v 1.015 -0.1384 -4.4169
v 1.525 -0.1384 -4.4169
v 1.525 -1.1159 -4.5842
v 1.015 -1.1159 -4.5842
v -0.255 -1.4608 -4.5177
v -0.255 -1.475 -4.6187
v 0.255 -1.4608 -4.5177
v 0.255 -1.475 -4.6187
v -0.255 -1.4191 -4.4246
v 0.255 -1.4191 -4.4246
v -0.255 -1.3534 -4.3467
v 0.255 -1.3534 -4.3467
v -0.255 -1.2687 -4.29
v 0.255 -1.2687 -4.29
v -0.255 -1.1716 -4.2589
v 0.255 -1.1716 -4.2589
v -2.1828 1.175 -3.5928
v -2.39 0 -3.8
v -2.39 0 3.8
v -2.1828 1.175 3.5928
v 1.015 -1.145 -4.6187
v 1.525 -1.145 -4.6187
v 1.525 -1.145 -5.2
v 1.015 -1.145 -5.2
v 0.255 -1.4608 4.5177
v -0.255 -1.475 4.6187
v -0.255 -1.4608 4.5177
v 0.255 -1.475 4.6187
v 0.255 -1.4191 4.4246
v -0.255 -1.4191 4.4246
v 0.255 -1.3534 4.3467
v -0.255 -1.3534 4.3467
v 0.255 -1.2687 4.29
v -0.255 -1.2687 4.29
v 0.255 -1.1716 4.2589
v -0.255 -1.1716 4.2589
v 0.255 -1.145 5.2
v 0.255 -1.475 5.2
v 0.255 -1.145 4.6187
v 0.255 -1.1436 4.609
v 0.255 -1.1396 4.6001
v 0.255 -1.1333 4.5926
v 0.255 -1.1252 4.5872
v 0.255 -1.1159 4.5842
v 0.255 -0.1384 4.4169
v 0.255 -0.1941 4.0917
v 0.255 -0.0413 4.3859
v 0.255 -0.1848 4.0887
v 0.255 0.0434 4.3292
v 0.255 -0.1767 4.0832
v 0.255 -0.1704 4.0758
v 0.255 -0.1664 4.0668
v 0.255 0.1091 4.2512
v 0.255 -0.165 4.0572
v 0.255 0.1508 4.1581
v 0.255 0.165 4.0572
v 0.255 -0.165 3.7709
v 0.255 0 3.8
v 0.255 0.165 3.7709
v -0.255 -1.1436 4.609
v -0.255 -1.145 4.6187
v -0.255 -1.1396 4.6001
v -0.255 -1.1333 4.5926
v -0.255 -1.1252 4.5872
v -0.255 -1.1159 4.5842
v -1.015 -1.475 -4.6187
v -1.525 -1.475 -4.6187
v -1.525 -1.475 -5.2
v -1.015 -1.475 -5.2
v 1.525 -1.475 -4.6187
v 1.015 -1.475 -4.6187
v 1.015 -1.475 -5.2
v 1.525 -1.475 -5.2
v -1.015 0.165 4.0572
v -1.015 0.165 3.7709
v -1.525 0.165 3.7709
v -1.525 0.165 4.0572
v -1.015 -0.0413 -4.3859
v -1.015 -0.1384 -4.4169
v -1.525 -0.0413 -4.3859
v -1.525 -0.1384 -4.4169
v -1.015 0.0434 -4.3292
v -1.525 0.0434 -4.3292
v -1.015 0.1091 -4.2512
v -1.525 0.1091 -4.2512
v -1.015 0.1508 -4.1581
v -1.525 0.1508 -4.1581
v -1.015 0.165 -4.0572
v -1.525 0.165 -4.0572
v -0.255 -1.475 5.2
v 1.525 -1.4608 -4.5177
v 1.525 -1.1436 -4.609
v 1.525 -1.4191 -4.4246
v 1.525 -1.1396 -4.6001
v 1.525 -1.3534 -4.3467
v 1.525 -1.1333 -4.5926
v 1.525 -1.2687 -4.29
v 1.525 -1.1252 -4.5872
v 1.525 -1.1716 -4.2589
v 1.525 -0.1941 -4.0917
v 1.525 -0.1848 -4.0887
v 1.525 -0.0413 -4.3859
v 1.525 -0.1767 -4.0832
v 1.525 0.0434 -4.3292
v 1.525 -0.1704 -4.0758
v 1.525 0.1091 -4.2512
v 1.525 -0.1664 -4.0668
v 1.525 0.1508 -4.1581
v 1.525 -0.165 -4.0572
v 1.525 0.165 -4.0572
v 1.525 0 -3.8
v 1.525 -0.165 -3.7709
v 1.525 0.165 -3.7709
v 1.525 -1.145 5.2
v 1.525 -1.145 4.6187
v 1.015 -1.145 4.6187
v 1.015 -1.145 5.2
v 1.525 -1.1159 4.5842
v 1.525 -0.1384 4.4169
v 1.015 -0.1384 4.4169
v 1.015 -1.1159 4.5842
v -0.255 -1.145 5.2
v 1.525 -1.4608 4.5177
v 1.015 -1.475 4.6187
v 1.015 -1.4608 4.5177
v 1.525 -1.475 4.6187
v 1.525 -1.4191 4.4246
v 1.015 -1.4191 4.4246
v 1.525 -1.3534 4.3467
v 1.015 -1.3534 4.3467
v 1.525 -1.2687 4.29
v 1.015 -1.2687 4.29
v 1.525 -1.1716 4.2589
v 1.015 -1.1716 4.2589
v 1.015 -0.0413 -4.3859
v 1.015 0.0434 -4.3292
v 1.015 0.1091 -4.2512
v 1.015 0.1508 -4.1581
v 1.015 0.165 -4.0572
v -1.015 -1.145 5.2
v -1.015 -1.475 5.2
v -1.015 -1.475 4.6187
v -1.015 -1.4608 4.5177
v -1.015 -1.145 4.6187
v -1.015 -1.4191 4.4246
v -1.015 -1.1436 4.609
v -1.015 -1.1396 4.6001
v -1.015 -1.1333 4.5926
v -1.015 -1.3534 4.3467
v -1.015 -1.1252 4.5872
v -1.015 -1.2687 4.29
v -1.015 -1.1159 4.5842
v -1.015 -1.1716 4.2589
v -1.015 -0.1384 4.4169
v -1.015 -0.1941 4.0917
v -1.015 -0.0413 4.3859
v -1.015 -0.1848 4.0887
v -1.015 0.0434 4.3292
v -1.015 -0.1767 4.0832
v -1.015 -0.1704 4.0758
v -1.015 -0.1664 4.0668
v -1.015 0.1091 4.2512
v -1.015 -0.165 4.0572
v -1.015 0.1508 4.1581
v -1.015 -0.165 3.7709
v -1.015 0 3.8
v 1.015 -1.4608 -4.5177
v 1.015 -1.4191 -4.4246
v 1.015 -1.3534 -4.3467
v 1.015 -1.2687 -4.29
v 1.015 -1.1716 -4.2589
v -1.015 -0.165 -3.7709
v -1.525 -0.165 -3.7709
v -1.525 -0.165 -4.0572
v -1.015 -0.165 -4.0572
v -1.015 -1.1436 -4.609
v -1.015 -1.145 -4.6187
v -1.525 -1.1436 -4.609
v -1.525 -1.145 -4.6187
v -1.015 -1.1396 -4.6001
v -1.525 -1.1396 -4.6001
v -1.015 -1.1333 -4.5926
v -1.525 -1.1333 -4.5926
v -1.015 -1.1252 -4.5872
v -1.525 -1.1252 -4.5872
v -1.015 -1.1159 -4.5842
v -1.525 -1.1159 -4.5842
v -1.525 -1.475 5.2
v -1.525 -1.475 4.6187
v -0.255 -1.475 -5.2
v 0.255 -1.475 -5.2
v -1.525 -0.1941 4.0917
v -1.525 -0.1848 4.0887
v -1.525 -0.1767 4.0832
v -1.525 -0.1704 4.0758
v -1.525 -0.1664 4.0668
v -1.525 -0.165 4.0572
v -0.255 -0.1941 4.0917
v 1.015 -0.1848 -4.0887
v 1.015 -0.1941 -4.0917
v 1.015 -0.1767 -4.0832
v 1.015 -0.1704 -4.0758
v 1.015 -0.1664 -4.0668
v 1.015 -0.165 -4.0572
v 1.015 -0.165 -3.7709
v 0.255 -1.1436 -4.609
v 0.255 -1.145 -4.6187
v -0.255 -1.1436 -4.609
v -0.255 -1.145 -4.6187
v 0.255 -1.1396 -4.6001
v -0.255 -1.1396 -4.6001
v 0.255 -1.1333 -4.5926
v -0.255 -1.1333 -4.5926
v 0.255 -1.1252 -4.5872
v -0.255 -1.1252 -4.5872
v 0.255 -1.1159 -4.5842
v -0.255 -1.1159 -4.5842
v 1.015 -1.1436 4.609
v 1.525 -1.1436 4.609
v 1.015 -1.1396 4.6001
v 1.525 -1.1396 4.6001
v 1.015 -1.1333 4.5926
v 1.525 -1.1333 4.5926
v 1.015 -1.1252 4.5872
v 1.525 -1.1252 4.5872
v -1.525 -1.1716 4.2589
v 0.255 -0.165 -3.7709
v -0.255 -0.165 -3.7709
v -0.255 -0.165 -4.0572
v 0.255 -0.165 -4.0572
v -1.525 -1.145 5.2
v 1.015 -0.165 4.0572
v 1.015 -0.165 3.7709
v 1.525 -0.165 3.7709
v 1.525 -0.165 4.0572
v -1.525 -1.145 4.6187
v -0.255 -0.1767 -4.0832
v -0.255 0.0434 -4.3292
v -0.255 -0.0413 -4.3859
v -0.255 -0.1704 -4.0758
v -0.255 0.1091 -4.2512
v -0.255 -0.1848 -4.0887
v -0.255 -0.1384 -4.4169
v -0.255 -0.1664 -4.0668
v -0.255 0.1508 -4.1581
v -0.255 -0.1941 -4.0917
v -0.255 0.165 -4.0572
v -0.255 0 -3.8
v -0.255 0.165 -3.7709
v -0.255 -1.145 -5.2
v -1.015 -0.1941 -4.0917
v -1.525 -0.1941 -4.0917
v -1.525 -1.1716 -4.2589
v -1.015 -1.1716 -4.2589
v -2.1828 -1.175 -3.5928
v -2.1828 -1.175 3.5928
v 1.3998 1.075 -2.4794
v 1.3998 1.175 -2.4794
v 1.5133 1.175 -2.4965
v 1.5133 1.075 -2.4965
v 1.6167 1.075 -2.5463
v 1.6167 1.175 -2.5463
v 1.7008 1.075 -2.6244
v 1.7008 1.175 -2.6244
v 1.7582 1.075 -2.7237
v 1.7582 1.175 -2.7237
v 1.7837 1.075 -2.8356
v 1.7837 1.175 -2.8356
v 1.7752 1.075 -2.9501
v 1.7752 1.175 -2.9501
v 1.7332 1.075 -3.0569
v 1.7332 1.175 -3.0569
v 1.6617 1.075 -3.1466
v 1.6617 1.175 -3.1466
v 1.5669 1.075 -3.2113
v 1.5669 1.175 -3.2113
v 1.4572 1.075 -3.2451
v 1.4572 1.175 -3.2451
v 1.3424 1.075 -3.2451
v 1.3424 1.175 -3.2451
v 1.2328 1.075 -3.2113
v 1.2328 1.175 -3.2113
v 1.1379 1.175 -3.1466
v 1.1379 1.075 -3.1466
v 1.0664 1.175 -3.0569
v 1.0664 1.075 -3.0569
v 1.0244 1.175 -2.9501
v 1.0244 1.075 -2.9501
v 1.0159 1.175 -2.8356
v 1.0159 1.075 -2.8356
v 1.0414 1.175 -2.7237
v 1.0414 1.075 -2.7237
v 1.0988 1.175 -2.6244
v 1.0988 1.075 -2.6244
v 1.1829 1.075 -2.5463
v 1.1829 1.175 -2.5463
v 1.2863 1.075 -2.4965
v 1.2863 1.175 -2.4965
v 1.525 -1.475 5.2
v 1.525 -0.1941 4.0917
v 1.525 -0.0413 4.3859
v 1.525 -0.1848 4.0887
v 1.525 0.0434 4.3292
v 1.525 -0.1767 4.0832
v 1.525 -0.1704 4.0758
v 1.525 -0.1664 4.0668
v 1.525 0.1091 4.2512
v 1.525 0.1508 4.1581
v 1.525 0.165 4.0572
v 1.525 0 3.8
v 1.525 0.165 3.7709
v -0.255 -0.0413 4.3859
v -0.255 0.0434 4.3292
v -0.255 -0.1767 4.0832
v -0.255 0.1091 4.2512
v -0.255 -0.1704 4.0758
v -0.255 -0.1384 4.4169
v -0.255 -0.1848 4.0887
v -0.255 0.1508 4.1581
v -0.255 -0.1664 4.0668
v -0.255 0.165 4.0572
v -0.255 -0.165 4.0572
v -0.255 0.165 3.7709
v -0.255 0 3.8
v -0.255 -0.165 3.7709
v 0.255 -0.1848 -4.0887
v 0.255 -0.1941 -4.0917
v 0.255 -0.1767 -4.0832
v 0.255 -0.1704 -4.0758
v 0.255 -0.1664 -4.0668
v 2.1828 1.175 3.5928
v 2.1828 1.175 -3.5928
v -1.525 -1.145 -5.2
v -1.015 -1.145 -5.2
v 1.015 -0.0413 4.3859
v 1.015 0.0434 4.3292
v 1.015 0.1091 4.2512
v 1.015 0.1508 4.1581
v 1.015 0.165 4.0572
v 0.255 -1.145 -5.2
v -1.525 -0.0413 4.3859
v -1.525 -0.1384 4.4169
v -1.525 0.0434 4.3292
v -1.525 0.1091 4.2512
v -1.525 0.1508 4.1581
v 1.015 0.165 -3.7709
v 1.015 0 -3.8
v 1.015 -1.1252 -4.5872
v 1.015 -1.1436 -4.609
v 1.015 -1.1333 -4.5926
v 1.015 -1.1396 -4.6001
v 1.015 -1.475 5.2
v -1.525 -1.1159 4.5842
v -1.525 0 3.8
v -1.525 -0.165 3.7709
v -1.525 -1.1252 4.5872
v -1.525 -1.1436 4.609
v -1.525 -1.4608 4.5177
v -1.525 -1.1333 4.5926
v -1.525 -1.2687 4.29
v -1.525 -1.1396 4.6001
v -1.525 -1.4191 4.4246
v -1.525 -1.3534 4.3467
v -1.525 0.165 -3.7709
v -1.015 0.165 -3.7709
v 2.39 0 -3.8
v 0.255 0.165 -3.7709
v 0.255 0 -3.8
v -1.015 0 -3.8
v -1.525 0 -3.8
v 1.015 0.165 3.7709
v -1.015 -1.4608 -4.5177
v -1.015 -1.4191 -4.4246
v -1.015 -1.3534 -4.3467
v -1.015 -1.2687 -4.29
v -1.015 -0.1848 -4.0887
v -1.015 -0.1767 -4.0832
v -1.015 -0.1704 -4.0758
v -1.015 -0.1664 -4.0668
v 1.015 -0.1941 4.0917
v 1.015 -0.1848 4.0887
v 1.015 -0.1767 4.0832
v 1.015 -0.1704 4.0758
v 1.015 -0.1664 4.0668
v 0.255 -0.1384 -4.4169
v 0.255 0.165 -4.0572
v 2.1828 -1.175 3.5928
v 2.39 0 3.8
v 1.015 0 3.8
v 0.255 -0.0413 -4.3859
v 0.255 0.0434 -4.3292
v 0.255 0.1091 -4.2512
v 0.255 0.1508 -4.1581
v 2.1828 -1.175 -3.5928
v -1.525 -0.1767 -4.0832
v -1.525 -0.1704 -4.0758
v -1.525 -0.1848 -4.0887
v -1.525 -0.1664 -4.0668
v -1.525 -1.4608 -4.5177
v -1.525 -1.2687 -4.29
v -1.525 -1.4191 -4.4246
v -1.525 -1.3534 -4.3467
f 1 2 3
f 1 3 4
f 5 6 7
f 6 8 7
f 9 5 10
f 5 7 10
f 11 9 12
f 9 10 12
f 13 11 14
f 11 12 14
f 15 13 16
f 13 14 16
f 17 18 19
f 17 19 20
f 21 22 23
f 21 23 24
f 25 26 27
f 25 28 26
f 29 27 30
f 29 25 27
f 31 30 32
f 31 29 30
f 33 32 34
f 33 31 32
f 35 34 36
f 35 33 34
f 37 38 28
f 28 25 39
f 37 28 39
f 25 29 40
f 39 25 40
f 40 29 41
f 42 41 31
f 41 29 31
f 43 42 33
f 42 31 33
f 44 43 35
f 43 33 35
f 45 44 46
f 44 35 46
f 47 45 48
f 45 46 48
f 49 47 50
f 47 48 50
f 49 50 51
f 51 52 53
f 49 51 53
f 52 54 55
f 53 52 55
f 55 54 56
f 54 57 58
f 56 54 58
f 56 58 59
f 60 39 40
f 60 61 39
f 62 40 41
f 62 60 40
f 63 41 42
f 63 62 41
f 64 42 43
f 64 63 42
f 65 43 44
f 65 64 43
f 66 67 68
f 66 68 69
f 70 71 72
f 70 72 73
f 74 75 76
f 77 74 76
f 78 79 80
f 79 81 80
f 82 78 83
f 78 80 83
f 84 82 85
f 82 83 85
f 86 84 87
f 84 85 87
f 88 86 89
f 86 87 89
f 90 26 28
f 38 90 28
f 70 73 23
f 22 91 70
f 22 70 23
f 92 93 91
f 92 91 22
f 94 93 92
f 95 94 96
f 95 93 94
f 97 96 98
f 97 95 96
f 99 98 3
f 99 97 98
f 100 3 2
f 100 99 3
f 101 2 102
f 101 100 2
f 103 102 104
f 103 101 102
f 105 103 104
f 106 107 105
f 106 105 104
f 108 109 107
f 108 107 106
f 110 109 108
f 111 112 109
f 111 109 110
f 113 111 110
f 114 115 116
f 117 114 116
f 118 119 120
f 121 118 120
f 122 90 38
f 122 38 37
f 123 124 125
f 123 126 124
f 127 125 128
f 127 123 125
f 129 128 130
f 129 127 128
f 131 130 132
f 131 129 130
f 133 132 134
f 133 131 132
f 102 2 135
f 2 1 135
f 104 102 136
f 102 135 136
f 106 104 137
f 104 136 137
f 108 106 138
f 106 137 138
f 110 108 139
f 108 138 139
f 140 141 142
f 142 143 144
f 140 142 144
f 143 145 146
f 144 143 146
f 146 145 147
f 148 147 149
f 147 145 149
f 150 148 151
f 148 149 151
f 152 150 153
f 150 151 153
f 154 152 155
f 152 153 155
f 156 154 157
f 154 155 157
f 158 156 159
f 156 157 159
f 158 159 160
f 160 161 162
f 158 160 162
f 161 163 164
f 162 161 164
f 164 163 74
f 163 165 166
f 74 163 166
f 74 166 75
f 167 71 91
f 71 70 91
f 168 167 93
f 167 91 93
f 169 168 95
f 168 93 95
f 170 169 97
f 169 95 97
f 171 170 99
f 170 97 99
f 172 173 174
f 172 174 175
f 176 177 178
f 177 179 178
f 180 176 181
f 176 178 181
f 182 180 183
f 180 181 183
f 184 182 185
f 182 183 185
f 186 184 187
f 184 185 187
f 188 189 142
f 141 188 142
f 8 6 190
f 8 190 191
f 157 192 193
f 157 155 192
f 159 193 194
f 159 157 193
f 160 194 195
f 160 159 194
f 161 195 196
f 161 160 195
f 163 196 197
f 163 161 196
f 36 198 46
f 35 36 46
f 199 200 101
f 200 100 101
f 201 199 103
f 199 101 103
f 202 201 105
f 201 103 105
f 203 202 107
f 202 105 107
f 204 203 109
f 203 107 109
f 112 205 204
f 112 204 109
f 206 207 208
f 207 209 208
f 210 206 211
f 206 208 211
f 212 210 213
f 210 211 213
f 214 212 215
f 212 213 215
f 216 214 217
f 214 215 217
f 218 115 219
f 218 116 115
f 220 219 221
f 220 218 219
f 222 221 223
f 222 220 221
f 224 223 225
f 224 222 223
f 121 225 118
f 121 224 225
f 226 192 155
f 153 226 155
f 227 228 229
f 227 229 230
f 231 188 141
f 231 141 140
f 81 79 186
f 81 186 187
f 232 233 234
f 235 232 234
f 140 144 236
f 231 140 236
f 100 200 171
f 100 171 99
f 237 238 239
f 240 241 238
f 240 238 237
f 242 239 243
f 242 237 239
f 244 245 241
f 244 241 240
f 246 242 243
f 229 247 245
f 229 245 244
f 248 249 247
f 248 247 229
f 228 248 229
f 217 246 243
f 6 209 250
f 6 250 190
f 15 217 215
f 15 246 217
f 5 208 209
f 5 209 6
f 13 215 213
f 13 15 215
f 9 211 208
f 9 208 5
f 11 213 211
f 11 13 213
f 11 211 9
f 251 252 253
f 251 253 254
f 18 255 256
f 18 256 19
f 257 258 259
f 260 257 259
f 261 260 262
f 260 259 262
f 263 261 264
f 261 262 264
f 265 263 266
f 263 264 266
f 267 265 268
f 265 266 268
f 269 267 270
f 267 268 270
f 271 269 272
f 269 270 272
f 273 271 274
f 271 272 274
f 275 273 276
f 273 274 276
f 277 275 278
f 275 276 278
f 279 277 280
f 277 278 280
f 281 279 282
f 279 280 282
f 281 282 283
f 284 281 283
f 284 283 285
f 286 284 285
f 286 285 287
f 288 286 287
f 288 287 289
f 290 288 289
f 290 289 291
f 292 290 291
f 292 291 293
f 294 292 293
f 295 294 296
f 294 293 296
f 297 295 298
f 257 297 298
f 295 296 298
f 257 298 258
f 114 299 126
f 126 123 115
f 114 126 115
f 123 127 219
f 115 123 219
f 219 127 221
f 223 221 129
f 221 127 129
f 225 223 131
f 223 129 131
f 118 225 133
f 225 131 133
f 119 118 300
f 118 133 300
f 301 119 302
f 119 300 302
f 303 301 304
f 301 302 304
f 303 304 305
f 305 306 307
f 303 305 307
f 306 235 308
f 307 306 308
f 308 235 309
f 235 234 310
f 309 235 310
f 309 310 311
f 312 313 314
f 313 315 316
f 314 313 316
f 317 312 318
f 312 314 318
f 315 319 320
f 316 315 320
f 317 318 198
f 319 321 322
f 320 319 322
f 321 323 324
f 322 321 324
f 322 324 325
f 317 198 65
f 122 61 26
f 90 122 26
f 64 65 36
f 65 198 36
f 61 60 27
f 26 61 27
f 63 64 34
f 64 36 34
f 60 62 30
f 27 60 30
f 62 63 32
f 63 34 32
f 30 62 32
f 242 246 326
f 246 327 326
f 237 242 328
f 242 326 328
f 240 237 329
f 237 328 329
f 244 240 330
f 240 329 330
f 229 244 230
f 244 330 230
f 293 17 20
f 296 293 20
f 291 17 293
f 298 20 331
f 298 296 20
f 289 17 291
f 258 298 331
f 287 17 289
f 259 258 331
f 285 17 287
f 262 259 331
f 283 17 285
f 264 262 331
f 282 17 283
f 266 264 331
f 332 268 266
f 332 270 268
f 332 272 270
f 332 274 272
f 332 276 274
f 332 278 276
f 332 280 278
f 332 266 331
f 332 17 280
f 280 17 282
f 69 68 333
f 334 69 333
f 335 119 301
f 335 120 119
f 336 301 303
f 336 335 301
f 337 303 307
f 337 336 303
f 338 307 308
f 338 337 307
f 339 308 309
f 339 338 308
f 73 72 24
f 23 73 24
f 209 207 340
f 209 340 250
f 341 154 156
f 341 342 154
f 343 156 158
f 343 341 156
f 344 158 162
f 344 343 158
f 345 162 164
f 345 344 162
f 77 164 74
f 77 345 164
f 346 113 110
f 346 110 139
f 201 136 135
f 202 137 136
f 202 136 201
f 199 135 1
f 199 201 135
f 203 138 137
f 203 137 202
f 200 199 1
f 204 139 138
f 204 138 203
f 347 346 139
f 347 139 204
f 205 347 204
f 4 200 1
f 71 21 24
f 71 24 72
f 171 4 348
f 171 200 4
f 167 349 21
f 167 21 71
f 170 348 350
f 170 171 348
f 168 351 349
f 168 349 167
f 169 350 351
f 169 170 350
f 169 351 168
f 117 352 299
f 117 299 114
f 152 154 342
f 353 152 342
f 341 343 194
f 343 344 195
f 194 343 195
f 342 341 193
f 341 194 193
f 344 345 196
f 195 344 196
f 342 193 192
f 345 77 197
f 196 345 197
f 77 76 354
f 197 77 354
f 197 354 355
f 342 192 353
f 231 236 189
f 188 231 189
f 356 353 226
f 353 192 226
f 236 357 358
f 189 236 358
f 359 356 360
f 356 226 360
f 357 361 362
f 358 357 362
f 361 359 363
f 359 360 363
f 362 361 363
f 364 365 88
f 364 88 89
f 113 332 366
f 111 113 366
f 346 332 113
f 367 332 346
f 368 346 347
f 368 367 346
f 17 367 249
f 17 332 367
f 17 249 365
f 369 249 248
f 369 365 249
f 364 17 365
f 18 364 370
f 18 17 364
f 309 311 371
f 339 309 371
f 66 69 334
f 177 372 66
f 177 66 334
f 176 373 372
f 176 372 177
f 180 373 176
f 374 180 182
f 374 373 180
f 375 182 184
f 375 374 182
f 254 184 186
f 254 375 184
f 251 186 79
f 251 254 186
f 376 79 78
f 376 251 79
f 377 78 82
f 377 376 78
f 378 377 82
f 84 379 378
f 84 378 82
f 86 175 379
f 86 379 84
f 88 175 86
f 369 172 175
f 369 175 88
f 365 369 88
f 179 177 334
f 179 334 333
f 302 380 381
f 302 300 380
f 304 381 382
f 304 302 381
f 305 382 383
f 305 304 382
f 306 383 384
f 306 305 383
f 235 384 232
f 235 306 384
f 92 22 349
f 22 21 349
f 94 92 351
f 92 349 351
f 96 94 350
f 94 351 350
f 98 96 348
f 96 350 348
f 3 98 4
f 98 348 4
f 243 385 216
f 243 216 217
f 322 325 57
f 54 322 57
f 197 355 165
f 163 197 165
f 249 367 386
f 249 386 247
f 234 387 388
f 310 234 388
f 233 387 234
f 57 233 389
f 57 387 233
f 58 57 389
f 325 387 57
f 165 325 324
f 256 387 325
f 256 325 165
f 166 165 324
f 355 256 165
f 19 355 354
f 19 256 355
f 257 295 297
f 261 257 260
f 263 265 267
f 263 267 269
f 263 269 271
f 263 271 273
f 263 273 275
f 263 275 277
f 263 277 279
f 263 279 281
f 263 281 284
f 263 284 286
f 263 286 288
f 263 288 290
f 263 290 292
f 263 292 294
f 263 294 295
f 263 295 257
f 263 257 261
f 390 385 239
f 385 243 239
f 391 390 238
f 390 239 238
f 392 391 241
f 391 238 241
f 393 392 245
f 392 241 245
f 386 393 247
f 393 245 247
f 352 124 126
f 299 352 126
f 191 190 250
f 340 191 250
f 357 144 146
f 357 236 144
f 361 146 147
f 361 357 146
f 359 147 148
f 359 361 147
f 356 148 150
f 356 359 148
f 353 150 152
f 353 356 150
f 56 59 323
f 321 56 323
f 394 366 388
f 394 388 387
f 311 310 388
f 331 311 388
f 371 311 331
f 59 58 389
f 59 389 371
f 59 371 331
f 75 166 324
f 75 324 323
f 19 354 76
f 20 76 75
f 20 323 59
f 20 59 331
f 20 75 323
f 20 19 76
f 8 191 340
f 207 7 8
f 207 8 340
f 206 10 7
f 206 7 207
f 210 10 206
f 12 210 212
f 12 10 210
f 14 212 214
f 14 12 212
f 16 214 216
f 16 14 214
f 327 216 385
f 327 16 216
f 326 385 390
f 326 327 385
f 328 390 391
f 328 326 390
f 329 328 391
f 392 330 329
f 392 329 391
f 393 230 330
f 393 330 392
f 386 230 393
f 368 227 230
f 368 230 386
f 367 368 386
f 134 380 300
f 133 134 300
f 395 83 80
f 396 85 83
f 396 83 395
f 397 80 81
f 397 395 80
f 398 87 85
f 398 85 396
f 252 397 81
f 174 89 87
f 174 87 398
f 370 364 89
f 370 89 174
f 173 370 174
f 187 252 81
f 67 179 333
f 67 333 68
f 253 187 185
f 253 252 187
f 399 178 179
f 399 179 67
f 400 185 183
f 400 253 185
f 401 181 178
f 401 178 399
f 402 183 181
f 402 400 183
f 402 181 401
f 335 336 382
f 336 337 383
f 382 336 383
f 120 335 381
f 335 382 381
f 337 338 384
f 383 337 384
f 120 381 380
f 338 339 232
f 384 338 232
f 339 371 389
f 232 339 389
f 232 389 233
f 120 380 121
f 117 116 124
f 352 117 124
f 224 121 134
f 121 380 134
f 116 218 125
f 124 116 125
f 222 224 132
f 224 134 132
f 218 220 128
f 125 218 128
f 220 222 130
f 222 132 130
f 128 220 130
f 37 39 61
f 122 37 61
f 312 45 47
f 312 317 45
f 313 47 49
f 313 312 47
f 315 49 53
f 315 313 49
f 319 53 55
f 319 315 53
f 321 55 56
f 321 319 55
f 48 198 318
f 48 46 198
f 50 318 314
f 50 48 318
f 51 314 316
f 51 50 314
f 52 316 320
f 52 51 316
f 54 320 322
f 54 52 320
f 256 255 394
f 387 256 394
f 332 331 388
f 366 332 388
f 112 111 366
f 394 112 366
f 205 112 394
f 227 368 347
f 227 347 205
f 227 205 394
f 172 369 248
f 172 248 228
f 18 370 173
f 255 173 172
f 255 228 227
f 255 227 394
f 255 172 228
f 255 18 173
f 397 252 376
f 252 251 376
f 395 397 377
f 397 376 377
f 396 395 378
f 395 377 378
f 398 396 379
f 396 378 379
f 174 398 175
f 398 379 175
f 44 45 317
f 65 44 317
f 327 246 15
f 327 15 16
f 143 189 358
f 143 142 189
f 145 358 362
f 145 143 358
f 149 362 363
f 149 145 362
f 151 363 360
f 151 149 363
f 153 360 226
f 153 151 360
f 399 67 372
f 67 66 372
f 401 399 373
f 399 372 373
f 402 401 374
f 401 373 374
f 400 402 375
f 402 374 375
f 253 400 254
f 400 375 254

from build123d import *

# Parameters (mm, degrees)
SKETCH1_W           = 4.78
SKETCH1_H           = 7.6
BOSS_EXTRUDE1_DEPTH = 1.175
DRAFT1_START        = -2.39
DRAFT1_DEPTH        = 4.78
DRAFT1_START_2      = -5
DRAFT1_2_DEPTH      = 10
DRAFT2_START        = -2.39
DRAFT2_DEPTH        = 4.78
DRAFT2_START_2      = -5
DRAFT2_2_DEPTH      = 10
SKETCH2_W           = 0.51
SKETCH2_H           = 0.33
SKETCH5_R           = 0.385012942
CUT_EXTRUDE1_DEPTH  = 0.1


with BuildPart() as part:
    # Sketch1 → Boss-Extrude1 (new, symmetric)
    with BuildSketch(Plane(origin=(0, 0, 0), x_dir=(1, 0, 0), z_dir=(0, 1, 0))):
        Rectangle(SKETCH1_W, SKETCH1_H)
    extrude(amount=BOSS_EXTRUDE1_DEPTH, both=True)

    # Draft1: read off the stored shape, not the designer's step
    # Draft1 outline → Draft1 (cut)
    with BuildSketch(Plane.YZ.offset(DRAFT1_START)):
        Polygon((0, 3.8), (1.175, 3.592815798), (1.175, 3.8), align=None)
        Polygon((1.175, -3.592815798), (0, -3.8), (1.175, -3.8), align=None)
    extrude(amount=DRAFT1_DEPTH, mode=Mode.SUBTRACT)

    # Draft1 2 outline → Draft1 2 (cut)
    with BuildSketch(Plane.XY.offset(DRAFT1_START_2)):
        Polygon((2.39, 1.175), (2.182815798, 1.175), (2.39, 0), align=None)
        Polygon((-2.39, 0), (-2.182815798, 1.175), (-2.39, 1.175), align=None)
    extrude(amount=DRAFT1_2_DEPTH, mode=Mode.SUBTRACT)

    # Draft2: read off the stored shape, not the designer's step
    # Draft2 outline → Draft2 (cut)
    with BuildSketch(Plane.YZ.offset(DRAFT2_START)):
        Polygon((0, -3.8), (-1.175, -3.592815798), (-1.175, -3.8), align=None)
        Polygon((-1.175, 3.592815798), (0, 3.8), (-1.175, 3.8), align=None)
    extrude(amount=DRAFT2_DEPTH, mode=Mode.SUBTRACT)

    # Draft2 2 outline → Draft2 2 (cut)
    with BuildSketch(Plane.XY.offset(DRAFT2_START_2)):
        Polygon((-2.39, -1.175), (-2.182815798, -1.175), (-2.39, 0), align=None)
        Polygon((2.39, 0), (2.182815798, -1.175), (2.39, -1.175), align=None)
    extrude(amount=DRAFT2_2_DEPTH, mode=Mode.SUBTRACT)

    # Sweep1: sweep along a path in Sketch3
    with BuildLine(Plane(origin=(0, 0, 0), x_dir=(0, 0, -1), z_dir=(1, 0, 0))) as sweep1_path:
        Line((-5.2, -1.31), (-4.618685307, -1.31))
        ThreePointArc((-4.618685307, -1.31), (-4.489740009, -1.262882667), (-4.421550295, -1.1437311))
        Line((-4.421550295, -1.1437311), (-4.254300072, -0.1662689))
        ThreePointArc((-4.254300072, -0.1662689), (-4.186110358, -0.047117333), (-4.05716506, 0))
        Line((-4.05716506, 0), (-3.8, 0))
        Line((-3.8, 0), (-2.8, 0))
    # Sketch2 → Sweep1 (sweep)
    with BuildSketch(Plane.XY.offset(3.8)):
        Rectangle(SKETCH2_W, SKETCH2_H)
        with Locations((1.27, 0)):
            Rectangle(SKETCH2_W, SKETCH2_H)
        with Locations((-1.27, 0)):
            Rectangle(SKETCH2_W, SKETCH2_H)
    sweep1 = sweep(path=sweep1_path.line)

    # Mirror1: Sweep1 across plane
    add(sweep1.mirror(Plane.XY))

    # Sketch5 → Cut-Extrude1 (cut)
    with BuildSketch(Plane(origin=(0, 1.175, 0), x_dir=(1, 0, 0), z_dir=(0, 1, 0))):
        with Locations(Location((1.399803613, 2.864403821, 0), (0, 0, 270))):
            Circle(SKETCH5_R)
    extrude(amount=-CUT_EXTRUDE1_DEPTH, mode=Mode.SUBTRACT)


solid = part.part
